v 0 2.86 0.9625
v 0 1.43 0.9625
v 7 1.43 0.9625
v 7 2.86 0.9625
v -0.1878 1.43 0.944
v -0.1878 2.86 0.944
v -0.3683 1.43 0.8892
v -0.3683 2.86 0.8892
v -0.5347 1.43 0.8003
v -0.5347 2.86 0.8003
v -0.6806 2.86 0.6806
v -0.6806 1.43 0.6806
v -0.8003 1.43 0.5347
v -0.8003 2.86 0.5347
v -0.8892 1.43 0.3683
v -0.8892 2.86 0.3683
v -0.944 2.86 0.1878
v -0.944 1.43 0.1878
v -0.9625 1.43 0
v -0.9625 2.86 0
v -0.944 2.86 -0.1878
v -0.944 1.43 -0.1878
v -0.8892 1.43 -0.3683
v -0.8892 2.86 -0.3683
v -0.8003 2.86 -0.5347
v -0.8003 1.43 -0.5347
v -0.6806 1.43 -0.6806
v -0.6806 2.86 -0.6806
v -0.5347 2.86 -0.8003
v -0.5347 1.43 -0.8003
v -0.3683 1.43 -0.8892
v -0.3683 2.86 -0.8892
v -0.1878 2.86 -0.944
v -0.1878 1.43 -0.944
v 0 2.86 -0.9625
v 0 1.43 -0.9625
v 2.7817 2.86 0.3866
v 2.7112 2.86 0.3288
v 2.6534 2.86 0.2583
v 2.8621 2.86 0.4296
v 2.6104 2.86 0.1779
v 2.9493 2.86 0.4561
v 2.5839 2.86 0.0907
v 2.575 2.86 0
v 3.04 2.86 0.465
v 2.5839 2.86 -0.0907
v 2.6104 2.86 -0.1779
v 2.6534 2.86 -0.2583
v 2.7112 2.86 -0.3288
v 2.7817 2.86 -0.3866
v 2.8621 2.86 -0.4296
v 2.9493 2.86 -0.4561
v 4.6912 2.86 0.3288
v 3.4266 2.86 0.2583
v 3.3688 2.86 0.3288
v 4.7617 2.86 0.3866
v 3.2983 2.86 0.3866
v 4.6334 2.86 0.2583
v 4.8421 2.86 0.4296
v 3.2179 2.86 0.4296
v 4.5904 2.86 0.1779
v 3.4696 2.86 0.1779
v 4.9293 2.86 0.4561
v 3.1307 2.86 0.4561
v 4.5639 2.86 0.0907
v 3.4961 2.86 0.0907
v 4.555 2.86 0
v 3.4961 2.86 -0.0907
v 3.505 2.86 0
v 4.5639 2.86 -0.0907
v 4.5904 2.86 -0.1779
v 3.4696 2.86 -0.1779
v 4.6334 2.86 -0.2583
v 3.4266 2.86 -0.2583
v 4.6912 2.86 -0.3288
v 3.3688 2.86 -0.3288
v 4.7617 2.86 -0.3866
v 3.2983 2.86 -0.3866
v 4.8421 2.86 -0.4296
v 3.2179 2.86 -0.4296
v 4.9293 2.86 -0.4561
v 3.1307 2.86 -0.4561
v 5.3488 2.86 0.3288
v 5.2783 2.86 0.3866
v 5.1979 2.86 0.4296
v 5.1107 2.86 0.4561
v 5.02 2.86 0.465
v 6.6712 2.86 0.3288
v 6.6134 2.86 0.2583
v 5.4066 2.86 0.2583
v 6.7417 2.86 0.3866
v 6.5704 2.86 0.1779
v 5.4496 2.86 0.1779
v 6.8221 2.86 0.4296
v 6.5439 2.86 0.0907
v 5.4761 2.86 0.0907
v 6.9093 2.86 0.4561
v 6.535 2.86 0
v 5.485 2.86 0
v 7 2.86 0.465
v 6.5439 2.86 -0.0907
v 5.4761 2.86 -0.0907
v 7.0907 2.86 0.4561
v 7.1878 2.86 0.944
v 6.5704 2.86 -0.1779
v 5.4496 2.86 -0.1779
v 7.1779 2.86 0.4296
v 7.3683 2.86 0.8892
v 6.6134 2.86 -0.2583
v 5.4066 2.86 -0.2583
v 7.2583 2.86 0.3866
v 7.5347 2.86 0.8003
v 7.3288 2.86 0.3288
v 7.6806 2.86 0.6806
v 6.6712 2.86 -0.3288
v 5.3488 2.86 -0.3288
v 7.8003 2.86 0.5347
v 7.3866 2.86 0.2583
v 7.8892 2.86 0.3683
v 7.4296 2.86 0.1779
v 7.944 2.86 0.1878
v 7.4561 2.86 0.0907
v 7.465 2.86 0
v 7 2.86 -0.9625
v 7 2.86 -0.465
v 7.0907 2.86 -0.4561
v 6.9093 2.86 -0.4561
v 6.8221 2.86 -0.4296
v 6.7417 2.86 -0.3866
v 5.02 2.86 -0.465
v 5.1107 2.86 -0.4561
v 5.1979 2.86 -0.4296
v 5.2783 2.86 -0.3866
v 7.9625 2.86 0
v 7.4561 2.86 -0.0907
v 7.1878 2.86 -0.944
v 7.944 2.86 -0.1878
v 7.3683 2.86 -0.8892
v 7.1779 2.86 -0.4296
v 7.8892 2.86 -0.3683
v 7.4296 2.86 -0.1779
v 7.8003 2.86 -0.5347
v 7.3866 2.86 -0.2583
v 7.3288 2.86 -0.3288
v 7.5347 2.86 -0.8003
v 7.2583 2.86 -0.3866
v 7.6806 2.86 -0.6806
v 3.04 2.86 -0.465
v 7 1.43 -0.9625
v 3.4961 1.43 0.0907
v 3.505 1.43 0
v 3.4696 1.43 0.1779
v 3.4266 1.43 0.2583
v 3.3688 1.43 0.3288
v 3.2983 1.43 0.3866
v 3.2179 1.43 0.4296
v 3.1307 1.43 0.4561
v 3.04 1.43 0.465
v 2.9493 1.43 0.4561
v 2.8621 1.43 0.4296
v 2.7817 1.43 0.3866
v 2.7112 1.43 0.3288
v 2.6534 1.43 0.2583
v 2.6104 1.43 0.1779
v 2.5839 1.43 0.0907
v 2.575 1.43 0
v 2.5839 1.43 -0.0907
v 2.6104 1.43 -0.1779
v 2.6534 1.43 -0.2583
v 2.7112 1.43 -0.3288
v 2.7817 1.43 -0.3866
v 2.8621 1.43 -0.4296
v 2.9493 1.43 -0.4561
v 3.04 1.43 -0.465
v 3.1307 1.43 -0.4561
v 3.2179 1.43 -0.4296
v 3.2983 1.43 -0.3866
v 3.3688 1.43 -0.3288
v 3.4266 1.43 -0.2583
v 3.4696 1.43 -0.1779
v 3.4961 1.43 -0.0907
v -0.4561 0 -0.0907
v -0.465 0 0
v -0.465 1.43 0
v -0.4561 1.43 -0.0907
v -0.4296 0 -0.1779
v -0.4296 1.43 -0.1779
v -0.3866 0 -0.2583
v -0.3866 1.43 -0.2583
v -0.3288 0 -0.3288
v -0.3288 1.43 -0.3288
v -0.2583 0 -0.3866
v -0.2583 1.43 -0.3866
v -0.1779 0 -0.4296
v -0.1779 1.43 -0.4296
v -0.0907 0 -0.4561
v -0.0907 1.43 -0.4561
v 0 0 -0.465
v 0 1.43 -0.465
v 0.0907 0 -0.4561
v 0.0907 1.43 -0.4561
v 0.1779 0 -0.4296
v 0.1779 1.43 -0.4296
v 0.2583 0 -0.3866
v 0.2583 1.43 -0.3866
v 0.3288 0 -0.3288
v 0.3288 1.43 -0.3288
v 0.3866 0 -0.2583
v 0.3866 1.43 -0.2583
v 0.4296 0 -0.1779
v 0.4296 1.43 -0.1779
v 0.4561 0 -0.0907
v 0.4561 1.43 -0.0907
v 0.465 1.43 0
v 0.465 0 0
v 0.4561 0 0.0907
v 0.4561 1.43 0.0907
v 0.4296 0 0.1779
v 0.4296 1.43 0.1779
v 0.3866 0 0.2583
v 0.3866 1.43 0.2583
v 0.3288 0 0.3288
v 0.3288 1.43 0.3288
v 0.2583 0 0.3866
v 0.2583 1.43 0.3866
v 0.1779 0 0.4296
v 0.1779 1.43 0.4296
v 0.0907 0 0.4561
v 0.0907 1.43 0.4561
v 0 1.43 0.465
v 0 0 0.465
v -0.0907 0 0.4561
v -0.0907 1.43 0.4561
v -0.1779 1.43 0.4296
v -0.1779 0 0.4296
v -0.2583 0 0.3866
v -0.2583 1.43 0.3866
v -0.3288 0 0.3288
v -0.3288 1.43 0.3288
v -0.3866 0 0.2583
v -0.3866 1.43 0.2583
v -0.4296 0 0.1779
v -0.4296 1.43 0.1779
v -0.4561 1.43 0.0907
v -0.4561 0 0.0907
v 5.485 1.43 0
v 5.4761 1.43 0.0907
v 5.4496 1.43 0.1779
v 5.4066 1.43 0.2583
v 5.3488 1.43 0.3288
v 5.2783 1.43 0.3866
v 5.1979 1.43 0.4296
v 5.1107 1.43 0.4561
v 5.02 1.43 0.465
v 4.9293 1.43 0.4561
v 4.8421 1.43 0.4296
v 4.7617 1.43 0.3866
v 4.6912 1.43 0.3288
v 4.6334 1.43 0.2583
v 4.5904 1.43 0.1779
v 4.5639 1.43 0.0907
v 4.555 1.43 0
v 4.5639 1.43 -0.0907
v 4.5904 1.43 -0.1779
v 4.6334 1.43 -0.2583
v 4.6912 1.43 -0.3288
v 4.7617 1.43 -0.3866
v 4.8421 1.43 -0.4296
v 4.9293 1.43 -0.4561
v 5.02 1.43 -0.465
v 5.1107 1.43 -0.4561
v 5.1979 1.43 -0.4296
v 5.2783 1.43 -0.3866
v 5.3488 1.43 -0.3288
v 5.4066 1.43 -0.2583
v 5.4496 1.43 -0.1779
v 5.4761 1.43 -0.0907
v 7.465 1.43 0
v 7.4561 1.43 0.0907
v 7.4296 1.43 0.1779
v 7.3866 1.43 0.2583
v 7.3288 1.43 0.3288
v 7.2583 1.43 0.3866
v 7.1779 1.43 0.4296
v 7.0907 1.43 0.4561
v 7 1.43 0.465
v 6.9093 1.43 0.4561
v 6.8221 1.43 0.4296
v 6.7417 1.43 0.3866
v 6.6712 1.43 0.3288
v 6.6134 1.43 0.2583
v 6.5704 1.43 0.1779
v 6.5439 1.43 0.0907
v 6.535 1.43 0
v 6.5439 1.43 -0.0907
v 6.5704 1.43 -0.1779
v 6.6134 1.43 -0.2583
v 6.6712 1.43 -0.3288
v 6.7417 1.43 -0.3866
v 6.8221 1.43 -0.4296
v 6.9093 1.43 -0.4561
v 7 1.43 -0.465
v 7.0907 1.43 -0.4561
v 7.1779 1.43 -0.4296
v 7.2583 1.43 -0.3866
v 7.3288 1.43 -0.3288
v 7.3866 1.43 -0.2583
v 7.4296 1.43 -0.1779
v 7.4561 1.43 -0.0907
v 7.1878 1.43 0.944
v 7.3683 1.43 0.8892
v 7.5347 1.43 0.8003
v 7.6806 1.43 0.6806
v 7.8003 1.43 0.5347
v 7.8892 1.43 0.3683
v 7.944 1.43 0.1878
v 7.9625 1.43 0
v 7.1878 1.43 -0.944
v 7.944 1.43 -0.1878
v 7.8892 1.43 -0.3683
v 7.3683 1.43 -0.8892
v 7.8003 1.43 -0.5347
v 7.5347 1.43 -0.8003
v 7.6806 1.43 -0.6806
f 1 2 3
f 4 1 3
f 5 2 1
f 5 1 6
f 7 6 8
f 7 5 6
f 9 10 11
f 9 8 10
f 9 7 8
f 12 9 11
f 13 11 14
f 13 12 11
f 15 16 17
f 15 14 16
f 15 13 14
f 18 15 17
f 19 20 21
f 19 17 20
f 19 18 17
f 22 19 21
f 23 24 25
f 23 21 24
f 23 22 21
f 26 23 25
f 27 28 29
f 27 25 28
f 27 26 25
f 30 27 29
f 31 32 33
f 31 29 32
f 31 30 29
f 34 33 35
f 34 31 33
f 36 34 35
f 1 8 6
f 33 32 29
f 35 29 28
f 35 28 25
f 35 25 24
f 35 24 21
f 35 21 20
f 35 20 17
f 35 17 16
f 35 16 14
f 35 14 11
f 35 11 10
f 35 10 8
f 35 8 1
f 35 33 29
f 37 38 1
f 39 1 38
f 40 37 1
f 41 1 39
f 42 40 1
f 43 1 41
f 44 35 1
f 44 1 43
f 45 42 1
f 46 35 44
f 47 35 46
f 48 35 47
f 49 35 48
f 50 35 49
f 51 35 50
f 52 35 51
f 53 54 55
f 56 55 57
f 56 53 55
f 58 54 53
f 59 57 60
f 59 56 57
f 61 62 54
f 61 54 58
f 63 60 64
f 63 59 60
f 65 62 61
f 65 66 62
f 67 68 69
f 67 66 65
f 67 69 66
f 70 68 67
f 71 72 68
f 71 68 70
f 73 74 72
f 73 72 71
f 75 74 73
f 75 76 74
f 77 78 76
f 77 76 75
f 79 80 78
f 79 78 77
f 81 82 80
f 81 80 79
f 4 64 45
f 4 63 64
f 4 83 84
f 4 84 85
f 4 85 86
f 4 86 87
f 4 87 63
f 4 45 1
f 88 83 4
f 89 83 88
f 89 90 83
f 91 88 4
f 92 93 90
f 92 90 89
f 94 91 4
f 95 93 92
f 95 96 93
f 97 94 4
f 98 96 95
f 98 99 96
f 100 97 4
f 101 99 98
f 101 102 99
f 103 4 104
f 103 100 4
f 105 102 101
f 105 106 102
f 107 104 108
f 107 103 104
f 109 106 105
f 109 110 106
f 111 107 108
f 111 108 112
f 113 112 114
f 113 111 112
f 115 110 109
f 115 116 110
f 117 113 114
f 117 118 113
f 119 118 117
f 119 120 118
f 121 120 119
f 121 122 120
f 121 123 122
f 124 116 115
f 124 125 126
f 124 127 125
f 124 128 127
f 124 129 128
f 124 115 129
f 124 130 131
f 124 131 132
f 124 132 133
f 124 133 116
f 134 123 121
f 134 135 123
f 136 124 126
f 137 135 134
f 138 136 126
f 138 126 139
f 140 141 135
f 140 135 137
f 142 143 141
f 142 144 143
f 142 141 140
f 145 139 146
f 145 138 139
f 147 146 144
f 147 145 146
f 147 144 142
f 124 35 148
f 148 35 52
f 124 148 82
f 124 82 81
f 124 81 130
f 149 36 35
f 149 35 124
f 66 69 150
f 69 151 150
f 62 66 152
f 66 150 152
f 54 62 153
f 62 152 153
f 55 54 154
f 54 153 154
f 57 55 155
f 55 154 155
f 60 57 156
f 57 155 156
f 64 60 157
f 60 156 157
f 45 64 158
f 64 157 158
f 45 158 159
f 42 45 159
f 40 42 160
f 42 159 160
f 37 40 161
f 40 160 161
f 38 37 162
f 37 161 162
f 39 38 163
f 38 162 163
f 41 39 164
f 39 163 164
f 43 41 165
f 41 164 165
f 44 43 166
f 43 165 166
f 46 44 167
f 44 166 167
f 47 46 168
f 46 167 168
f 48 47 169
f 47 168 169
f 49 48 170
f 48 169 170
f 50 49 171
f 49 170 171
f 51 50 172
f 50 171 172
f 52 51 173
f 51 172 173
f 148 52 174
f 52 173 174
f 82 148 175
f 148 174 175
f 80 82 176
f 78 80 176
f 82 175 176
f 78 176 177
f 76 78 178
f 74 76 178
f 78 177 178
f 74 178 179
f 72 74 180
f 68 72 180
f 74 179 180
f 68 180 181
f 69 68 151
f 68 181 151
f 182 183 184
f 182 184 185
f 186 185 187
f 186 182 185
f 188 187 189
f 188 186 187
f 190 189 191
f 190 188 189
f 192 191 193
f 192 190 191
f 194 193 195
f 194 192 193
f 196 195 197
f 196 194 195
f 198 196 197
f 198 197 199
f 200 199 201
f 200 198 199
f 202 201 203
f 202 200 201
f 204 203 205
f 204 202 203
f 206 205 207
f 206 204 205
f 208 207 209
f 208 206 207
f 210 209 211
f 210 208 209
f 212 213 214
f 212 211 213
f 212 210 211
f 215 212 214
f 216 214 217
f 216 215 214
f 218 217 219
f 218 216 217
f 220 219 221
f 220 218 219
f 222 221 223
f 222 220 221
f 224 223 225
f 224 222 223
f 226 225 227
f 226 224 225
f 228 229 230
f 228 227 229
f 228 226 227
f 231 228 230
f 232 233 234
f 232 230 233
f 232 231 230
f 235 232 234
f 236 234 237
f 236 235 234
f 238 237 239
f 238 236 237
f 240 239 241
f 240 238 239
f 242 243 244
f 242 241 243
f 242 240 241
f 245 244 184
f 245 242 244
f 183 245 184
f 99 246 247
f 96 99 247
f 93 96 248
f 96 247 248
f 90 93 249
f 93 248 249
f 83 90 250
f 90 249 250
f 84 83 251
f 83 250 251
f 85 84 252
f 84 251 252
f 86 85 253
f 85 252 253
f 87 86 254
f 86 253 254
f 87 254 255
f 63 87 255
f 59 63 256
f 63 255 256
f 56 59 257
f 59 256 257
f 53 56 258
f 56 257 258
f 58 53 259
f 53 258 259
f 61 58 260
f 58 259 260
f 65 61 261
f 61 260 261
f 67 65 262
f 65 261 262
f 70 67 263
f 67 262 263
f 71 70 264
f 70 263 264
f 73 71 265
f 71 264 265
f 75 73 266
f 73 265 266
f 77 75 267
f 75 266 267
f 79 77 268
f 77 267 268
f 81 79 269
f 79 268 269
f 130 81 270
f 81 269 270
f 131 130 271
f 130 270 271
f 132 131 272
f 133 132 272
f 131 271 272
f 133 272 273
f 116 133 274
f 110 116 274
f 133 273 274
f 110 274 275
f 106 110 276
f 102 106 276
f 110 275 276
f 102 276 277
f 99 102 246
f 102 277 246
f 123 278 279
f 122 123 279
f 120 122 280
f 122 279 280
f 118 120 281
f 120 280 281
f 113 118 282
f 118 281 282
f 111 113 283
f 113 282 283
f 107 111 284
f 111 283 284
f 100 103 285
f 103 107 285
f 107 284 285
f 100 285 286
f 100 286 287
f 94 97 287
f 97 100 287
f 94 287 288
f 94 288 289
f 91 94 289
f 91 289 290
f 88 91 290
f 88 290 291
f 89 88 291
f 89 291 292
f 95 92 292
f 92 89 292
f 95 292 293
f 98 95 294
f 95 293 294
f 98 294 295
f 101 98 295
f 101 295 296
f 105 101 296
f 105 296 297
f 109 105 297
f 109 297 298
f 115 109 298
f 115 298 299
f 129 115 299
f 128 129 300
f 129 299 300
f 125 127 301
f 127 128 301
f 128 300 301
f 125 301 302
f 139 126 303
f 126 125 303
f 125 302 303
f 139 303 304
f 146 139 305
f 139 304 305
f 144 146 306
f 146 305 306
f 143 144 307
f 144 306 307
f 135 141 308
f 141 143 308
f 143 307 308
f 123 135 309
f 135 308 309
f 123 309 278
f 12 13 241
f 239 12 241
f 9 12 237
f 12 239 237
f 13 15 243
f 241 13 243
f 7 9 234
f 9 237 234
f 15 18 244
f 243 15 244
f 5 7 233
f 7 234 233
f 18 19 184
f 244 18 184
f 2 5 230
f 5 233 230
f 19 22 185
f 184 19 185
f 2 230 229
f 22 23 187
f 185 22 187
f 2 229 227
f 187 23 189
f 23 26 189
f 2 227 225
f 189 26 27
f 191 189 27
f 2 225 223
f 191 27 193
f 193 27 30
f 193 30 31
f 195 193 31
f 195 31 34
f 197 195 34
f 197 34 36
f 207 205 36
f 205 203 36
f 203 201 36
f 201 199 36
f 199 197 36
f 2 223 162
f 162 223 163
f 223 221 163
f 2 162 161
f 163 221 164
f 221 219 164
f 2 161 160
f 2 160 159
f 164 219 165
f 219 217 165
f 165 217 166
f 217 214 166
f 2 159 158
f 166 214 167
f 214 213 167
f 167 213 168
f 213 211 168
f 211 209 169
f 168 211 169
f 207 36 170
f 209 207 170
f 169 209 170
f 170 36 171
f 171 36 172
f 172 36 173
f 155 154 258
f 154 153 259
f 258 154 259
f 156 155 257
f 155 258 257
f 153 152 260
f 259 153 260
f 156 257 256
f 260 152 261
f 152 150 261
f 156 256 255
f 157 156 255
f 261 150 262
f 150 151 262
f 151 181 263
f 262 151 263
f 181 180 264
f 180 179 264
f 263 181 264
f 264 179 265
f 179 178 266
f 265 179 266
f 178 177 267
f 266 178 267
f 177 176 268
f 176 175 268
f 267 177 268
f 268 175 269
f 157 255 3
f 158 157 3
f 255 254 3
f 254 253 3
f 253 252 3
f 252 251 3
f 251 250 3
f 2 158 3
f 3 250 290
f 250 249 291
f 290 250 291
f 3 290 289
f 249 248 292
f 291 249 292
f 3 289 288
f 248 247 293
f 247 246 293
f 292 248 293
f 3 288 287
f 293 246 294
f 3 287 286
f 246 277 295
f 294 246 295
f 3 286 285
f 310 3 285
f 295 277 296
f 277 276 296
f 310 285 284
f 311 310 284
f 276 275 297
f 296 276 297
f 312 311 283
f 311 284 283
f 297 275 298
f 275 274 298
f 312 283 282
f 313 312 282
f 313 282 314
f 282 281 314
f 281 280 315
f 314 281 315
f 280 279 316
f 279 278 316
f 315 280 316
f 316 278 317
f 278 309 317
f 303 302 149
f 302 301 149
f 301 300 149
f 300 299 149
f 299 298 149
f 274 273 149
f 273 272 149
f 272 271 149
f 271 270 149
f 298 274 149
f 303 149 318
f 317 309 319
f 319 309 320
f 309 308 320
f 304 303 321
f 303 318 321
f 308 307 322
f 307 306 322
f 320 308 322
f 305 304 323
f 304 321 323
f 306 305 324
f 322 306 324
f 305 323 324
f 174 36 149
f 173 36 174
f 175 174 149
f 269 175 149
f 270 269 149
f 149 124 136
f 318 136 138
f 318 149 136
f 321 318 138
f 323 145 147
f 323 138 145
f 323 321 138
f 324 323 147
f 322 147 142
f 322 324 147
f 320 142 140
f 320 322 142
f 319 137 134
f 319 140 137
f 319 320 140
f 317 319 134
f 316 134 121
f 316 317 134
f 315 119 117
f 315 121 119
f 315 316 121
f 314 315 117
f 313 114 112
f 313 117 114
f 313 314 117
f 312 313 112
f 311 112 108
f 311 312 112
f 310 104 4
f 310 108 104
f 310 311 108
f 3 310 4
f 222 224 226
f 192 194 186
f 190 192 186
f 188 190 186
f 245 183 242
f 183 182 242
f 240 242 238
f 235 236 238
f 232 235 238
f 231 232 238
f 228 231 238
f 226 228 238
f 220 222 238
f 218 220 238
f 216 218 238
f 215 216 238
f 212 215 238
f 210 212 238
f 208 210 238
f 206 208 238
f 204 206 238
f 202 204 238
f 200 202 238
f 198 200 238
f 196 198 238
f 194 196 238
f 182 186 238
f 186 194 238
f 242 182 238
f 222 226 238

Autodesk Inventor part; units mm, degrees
ref_plane "YZ Plane" through (0, 0, 0) normal (1, 0, 0) x (0, 1, 0)
ref_plane "XZ Plane" through (0, 0, 0) normal (0, 1, 0) x (-1, 0, 0)
ref_plane "XY Plane" through (0, 0, 0) normal (0, 0, 1) x (1, 0, 0)
sketch "Sketch1" plane through (0, 0, 0) normal (0, 1, 0) x (-1, 0, 0)
  circle A0 centre (0, 0) radius 0.465
  dimension "d0" = 0.93
extrude "Extrusion1" add sketch "Sketch1" along normal blind 1.43
sketch "Sketch2" plane through (0, 1.43, 0) normal (0, 1, 0) x (1, 0, 0)
  circle A0 centre (0, 0) radius 0.465 projected
  circle A1 centre (0, 0) radius 0.9625
  line L0 (0, 0) -> (7, 0)
  circle A2 centre (7, 0) radius 0.9625
  line L1 (0, -0.9625) -> (7, -0.9625)
  line L2 (0, 0.9625) -> (7, 0.9625)
  circle A3 centre (7, 0) radius 0.465
  circle A4 centre (5.02, 0) radius 0.465
  circle A5 centre (3.04, 0) radius 0.465
  dimension "d3" = 1.925
  dimension "d4" = 7
  dimension "d5" = 1.925
  dimension "d6" = 0.93
  dimension "d9" = 1.98
extrude "Extrusion2" add sketch "Sketch2" along normal blind 1.43 contours A0 | A1 | A1 L2 A2 L0 A4 A5 | L0 A5 A4 A2 L1 A1 | A2
properties part number "Servo Horn Extension"
